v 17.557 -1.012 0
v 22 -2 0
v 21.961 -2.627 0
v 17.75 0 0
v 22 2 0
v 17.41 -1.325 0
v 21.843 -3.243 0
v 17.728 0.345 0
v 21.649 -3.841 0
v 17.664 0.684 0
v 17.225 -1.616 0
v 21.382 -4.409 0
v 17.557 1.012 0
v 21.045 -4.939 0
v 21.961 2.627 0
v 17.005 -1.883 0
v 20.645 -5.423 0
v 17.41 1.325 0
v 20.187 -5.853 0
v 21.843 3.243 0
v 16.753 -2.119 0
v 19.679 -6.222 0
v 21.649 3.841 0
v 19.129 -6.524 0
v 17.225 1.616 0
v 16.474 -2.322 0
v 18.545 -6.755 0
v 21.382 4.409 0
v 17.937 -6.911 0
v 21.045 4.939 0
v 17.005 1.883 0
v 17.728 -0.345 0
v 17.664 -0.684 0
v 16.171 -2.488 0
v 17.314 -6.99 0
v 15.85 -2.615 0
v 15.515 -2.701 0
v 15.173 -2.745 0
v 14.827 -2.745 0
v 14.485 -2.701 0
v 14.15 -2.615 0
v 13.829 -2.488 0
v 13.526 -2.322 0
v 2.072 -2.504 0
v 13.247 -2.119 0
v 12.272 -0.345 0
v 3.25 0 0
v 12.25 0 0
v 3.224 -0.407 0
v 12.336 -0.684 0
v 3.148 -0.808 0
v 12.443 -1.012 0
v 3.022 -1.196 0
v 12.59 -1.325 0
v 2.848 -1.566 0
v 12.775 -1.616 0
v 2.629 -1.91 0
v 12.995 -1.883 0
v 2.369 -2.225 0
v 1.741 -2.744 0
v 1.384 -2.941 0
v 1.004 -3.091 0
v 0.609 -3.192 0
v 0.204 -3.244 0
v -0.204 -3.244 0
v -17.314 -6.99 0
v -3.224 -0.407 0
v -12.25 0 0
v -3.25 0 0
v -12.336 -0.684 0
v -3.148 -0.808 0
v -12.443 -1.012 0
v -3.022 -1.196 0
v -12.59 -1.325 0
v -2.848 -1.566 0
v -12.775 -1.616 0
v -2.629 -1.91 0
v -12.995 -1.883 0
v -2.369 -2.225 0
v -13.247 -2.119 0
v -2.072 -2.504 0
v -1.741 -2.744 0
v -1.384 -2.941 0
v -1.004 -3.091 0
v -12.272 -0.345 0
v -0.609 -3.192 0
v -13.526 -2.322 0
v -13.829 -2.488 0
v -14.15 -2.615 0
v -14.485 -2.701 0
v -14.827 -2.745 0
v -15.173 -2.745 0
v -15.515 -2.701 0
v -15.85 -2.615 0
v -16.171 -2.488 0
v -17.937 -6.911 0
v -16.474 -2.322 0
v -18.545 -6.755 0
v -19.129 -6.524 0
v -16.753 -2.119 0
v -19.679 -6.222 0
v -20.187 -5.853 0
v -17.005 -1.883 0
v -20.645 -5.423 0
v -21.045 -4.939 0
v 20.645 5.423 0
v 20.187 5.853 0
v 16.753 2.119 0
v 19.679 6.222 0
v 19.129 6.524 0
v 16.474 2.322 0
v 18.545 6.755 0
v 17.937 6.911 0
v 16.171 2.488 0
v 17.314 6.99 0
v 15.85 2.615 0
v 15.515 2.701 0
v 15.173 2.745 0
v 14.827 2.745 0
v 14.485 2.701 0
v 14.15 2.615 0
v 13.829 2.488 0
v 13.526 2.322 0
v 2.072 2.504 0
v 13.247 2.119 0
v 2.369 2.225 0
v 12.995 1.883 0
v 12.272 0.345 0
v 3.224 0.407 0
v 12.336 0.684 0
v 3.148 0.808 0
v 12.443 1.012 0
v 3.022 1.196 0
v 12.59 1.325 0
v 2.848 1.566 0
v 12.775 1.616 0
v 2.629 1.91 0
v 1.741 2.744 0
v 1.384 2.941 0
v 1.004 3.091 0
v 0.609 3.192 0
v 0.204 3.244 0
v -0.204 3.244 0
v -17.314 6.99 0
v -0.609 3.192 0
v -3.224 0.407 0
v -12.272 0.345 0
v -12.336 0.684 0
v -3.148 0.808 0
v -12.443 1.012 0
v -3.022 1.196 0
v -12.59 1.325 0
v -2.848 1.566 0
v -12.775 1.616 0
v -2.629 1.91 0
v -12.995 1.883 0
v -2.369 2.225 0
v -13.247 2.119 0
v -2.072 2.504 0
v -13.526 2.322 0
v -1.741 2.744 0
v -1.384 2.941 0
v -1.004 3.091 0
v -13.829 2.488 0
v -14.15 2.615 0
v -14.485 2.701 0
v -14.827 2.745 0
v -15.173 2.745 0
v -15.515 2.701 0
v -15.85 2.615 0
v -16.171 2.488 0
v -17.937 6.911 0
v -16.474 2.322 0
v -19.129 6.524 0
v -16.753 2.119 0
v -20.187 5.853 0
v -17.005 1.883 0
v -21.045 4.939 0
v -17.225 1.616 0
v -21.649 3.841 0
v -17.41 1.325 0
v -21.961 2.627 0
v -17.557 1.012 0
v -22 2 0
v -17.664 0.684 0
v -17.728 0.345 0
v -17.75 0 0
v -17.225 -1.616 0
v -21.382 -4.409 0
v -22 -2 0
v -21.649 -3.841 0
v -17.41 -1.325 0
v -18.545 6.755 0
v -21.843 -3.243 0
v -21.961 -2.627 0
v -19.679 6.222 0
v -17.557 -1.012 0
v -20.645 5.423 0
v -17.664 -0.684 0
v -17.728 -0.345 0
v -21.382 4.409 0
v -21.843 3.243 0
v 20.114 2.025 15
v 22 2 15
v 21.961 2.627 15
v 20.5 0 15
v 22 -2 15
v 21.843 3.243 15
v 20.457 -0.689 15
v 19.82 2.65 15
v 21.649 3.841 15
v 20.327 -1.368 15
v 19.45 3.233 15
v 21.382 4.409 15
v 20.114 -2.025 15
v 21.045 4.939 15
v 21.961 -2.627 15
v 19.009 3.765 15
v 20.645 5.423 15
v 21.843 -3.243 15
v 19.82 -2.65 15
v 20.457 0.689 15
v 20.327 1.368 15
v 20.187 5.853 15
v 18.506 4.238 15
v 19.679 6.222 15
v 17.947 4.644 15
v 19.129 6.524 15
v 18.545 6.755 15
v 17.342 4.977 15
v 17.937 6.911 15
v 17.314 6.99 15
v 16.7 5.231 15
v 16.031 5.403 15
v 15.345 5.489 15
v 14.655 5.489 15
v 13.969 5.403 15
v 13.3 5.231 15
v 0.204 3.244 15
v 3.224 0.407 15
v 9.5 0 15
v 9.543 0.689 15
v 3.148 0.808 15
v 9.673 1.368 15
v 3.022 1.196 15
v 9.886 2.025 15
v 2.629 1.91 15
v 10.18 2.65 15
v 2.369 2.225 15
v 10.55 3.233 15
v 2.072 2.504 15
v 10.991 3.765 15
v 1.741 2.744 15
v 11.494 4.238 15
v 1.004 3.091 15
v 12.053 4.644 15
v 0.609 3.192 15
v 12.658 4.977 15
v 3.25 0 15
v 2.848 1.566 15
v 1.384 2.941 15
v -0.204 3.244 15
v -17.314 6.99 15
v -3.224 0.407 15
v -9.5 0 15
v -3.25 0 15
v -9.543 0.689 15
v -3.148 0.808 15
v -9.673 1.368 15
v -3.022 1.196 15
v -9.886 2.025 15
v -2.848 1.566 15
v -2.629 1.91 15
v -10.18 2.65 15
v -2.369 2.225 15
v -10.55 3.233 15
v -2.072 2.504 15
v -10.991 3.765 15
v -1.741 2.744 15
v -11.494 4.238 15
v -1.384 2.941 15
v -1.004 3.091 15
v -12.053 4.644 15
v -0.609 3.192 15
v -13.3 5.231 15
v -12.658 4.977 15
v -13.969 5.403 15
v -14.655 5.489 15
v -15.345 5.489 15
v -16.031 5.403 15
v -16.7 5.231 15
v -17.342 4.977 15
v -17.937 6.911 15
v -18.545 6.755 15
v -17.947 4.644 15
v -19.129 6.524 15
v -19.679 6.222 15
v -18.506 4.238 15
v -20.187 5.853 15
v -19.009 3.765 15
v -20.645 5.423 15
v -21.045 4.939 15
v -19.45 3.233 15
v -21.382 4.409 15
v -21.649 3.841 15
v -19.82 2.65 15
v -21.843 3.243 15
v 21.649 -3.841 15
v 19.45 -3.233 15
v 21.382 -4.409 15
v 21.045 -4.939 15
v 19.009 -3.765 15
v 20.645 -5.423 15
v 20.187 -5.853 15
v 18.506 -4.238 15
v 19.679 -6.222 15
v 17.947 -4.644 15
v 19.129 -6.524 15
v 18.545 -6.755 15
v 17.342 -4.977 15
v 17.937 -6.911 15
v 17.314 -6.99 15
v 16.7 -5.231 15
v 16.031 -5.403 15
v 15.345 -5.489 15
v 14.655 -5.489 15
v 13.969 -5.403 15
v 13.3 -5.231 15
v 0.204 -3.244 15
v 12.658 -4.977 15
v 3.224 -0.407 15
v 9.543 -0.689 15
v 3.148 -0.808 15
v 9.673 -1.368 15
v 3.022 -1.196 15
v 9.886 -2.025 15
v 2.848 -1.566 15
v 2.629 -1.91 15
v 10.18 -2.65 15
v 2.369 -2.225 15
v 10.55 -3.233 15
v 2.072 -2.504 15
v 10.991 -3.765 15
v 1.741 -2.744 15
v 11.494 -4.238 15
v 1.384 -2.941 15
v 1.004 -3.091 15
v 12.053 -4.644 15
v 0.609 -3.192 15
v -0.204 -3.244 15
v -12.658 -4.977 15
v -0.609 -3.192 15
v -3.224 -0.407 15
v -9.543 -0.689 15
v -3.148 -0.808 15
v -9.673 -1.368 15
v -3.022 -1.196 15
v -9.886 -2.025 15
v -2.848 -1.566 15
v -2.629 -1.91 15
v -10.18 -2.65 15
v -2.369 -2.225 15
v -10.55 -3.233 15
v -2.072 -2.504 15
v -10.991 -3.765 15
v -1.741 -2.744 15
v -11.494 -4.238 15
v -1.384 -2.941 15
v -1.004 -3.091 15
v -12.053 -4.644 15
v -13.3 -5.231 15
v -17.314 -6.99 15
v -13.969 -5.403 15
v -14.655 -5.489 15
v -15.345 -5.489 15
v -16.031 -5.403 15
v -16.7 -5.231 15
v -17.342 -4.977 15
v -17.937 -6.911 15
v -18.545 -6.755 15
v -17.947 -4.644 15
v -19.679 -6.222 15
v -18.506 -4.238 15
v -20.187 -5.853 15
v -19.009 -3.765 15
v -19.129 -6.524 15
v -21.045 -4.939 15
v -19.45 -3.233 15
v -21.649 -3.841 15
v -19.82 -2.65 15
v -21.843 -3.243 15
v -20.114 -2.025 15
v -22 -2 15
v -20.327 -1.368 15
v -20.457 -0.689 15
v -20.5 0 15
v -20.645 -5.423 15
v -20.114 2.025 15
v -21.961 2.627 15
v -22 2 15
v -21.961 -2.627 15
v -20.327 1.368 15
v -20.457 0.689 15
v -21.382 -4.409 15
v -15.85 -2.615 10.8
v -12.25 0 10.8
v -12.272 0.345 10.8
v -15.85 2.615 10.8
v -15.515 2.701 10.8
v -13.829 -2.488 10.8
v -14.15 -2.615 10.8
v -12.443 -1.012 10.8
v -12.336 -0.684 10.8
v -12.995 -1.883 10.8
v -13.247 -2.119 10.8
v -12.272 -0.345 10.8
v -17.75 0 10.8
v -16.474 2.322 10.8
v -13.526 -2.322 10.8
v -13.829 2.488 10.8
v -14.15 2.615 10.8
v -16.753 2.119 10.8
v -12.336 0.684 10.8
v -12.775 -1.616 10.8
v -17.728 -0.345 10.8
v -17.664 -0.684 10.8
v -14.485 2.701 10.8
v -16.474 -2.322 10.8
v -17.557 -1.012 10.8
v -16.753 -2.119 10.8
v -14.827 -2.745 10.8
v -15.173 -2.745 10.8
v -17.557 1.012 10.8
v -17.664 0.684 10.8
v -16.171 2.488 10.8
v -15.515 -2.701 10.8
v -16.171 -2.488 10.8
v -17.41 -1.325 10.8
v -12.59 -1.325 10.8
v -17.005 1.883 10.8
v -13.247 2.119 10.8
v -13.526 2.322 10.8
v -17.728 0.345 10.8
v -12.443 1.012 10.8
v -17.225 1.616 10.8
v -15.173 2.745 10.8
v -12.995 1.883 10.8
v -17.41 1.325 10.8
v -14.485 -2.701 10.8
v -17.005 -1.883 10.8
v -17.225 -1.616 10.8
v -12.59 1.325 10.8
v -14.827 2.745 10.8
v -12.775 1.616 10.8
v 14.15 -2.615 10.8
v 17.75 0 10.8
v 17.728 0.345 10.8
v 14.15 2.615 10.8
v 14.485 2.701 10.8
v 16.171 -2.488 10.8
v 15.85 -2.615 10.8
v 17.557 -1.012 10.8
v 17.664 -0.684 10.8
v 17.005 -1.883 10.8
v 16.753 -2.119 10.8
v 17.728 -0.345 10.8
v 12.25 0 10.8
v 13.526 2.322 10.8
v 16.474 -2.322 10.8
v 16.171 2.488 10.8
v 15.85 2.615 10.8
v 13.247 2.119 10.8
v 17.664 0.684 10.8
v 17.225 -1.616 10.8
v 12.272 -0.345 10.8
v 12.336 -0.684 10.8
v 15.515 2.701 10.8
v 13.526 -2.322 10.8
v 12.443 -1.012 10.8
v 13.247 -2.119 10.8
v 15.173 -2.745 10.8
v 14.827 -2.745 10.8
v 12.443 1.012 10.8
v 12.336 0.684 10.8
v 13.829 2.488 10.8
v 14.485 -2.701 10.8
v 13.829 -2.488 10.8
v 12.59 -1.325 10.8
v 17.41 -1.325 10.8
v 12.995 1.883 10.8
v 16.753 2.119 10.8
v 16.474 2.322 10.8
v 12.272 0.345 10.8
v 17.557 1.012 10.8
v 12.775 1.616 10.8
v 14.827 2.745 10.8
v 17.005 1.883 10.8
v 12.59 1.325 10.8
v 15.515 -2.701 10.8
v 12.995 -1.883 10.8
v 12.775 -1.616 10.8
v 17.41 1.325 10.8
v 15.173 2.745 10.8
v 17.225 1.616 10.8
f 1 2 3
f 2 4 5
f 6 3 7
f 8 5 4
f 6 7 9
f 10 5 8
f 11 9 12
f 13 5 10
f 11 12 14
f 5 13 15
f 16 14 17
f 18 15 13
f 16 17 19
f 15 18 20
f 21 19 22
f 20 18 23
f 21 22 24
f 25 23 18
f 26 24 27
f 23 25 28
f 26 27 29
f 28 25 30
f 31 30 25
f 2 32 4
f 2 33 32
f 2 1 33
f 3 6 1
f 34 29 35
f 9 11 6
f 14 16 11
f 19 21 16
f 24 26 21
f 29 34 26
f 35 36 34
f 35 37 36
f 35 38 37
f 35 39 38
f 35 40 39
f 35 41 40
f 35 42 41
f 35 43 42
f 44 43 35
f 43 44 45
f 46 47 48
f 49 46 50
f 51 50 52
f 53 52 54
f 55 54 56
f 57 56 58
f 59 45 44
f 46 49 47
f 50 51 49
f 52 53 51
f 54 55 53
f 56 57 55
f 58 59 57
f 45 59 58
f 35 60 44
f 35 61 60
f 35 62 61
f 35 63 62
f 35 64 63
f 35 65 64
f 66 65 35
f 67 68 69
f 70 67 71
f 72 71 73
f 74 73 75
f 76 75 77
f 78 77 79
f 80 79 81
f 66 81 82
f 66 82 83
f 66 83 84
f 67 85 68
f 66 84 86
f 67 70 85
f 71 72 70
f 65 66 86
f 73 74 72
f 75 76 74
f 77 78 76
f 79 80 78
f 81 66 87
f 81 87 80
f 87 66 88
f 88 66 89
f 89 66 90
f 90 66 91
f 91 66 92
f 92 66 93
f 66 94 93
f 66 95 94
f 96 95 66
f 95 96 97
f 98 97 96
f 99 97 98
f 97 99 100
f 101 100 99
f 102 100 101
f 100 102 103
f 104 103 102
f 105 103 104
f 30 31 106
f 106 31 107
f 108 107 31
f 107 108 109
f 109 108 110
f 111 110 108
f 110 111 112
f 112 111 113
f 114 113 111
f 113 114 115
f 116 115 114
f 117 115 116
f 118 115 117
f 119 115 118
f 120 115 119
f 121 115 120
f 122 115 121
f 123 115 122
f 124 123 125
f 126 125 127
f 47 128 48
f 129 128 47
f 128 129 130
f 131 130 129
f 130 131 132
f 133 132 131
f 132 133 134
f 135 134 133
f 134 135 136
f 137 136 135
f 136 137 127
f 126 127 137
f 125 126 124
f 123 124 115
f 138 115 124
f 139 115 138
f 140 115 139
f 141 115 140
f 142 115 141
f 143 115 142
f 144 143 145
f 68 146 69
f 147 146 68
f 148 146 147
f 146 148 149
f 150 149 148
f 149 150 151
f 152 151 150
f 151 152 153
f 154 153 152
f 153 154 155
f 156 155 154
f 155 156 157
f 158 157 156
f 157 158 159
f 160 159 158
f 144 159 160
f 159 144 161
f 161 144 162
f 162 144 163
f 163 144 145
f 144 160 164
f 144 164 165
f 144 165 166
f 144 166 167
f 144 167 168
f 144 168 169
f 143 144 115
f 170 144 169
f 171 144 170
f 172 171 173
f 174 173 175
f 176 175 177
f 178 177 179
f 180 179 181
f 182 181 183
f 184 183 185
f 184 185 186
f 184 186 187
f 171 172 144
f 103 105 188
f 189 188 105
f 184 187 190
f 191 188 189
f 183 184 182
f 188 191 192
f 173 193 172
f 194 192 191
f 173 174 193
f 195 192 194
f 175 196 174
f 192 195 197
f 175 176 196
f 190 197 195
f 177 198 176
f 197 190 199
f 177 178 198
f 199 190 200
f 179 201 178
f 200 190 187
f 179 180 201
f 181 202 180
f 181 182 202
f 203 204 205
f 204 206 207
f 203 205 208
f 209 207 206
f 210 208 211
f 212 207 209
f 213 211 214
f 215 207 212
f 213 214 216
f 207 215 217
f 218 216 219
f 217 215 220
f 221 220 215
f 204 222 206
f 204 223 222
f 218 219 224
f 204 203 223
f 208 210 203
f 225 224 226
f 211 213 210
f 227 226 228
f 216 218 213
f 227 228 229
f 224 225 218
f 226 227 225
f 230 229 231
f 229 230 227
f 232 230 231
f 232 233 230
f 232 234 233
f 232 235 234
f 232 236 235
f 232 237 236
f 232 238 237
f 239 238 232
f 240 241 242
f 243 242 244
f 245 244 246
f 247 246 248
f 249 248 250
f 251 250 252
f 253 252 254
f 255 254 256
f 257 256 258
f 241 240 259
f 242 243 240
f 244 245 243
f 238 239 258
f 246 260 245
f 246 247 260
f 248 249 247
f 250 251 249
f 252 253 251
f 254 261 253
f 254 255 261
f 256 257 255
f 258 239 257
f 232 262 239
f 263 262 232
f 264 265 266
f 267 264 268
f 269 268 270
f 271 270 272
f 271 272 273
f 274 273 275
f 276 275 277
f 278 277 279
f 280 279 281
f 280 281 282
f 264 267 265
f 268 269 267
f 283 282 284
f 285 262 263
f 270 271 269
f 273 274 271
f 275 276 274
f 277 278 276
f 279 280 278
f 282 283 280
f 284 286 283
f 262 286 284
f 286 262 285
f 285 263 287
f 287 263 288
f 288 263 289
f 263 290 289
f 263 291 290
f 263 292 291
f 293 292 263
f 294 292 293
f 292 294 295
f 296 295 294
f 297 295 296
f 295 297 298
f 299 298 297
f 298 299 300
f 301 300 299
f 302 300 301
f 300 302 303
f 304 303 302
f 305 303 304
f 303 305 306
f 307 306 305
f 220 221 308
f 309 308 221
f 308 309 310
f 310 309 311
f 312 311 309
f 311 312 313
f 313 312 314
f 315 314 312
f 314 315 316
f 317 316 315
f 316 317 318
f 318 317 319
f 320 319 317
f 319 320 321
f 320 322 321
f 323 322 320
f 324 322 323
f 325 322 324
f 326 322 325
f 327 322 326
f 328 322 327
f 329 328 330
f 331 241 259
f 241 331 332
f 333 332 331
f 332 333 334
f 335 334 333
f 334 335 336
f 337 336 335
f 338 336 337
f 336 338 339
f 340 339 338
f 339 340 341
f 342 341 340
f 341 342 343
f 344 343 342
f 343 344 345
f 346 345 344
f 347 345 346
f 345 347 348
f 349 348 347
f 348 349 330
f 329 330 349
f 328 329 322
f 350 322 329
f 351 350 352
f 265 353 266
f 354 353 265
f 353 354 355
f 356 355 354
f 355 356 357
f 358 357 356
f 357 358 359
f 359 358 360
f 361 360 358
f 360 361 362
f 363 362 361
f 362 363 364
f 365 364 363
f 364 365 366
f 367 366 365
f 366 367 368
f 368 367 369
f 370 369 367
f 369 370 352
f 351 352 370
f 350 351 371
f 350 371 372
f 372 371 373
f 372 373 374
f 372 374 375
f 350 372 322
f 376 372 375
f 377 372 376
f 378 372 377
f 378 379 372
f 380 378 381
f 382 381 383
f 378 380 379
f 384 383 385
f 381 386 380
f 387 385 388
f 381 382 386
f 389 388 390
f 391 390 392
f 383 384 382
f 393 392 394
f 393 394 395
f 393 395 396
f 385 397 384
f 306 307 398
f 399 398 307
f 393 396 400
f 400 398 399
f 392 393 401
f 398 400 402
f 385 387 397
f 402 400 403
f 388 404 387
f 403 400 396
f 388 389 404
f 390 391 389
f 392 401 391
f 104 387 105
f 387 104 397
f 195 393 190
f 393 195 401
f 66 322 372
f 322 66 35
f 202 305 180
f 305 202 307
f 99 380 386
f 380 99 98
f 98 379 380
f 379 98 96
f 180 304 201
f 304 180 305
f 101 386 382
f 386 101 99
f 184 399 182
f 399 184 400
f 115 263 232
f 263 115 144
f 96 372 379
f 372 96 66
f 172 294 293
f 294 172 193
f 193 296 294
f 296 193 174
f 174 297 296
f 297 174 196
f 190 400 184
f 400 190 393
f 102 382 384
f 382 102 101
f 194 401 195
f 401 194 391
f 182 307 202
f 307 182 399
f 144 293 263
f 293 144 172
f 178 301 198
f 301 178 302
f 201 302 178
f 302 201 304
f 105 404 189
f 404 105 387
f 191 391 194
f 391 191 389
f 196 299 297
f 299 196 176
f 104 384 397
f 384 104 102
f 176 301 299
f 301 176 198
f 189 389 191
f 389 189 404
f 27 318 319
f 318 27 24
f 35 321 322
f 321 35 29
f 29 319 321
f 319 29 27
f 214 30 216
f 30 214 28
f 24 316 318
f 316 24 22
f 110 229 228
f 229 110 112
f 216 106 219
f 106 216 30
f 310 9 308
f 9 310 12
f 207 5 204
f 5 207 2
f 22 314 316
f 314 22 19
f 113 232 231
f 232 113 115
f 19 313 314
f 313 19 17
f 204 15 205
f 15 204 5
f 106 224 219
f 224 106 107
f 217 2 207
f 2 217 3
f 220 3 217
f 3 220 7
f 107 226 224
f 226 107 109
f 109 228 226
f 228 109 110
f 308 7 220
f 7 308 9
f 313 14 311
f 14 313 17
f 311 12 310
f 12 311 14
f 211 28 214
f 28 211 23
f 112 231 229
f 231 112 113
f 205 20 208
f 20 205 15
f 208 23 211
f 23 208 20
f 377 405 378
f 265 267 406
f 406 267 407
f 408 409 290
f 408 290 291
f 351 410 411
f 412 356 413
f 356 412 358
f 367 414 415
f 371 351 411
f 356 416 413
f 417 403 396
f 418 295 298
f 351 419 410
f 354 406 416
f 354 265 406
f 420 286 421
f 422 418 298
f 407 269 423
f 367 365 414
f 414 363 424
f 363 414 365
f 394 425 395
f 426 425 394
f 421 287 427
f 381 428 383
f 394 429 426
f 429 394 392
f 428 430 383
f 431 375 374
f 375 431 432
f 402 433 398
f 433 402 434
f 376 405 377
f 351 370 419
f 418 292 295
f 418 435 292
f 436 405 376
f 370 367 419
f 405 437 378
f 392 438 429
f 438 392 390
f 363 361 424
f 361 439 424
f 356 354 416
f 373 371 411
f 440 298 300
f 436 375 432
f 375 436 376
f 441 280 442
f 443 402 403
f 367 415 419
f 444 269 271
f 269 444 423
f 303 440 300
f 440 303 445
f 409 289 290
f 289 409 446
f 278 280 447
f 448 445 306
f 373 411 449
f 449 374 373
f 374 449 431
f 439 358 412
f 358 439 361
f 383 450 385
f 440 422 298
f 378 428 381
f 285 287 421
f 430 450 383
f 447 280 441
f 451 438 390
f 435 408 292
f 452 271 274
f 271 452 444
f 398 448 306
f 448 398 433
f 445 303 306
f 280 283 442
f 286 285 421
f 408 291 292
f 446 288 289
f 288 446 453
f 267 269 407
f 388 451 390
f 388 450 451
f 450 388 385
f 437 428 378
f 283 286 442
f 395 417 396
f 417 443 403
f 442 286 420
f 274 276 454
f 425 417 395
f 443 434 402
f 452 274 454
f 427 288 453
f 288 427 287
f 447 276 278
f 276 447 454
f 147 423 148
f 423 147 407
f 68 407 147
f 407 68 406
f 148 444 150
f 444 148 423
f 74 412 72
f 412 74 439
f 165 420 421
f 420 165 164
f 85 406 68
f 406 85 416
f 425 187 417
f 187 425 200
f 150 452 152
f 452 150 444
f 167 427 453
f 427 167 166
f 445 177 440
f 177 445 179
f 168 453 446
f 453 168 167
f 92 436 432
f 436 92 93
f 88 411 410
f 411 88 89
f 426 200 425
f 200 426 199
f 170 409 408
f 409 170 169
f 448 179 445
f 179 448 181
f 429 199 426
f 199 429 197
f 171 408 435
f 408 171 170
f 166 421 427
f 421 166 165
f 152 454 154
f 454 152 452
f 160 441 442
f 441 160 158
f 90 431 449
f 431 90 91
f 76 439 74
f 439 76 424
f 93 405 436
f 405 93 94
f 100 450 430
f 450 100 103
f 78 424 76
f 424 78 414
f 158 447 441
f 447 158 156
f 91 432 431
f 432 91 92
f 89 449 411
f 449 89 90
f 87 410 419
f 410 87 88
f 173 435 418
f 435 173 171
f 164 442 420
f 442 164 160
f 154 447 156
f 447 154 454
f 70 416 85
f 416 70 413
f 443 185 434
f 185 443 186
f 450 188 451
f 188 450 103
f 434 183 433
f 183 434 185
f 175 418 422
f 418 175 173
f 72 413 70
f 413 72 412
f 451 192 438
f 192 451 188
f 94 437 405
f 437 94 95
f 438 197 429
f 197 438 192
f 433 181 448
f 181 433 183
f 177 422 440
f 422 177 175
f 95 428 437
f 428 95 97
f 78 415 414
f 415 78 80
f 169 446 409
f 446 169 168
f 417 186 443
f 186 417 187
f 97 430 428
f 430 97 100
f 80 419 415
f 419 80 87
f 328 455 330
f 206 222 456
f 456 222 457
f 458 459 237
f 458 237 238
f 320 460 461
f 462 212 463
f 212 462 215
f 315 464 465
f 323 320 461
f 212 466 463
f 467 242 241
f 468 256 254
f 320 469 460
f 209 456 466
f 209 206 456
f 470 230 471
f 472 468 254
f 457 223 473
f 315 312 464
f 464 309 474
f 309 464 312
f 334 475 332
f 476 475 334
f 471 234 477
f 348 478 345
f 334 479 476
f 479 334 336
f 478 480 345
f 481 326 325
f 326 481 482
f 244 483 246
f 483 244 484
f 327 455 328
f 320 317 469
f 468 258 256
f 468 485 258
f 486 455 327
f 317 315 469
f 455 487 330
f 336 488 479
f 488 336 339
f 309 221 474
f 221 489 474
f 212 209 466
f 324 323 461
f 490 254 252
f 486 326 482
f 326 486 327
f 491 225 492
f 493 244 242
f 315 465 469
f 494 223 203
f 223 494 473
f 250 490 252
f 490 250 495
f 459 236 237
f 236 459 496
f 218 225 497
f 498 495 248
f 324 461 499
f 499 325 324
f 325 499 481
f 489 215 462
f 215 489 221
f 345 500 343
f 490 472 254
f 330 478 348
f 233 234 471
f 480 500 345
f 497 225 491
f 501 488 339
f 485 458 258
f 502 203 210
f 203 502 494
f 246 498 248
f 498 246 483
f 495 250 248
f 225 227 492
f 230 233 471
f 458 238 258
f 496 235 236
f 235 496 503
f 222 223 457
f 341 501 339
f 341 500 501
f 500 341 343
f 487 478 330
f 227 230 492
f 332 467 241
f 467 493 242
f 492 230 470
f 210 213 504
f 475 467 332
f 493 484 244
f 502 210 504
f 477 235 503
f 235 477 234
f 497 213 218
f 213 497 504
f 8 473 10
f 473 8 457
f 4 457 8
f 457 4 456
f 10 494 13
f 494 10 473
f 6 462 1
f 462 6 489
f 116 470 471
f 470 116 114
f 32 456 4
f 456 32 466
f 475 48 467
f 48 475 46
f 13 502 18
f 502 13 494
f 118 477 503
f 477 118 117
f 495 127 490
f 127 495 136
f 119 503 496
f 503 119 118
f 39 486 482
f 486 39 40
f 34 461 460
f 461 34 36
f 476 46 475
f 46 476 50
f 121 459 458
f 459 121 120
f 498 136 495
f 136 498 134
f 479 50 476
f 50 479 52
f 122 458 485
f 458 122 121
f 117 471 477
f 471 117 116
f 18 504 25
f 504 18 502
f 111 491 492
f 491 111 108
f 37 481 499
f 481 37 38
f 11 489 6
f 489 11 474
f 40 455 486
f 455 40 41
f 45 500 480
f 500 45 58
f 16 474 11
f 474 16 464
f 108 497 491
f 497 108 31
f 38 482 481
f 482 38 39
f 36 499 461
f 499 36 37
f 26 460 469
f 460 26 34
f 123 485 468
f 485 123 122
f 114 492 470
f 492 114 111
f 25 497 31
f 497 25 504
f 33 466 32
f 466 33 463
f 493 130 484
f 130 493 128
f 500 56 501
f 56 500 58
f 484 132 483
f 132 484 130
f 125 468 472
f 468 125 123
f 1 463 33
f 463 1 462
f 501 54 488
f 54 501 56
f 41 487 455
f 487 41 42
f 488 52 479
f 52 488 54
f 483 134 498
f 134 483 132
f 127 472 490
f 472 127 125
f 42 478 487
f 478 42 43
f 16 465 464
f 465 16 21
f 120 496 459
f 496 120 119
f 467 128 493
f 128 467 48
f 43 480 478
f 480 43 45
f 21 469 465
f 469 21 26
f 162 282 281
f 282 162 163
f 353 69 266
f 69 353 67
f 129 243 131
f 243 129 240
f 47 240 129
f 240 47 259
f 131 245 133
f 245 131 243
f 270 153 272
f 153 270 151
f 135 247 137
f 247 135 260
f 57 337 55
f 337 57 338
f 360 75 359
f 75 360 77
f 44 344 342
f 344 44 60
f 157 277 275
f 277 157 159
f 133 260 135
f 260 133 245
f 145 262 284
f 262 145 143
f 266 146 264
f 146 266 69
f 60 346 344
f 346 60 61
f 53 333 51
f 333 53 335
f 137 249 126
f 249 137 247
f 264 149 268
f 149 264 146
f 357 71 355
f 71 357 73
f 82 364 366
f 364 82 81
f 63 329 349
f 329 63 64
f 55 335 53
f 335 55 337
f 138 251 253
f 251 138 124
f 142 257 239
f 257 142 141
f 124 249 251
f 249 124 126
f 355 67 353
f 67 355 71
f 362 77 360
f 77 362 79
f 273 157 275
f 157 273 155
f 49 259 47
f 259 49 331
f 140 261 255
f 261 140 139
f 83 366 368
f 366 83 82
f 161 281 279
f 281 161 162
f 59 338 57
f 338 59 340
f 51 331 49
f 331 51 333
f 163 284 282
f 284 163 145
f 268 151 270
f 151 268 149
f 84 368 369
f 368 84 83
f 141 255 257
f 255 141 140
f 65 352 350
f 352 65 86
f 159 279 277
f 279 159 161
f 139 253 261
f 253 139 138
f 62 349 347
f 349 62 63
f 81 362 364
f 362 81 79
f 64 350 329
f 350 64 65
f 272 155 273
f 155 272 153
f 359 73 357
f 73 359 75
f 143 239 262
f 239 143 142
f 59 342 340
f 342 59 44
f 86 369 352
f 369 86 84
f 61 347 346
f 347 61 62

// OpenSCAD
$fn = 50;


difference() {
	union() {
		cylinder(h = 15, r = 7.0000000000);
		translate(v = [-7.5000000000, 0.0000000000, 0]) {
			hull() {
				translate(v = [-9.5000000000, 2.0000000000, 0]) {
					cylinder(h = 15, r = 5);
				}
				translate(v = [9.5000000000, 2.0000000000, 0]) {
					cylinder(h = 15, r = 5);
				}
				translate(v = [-9.5000000000, -2.0000000000, 0]) {
					cylinder(h = 15, r = 5);
				}
				translate(v = [9.5000000000, -2.0000000000, 0]) {
					cylinder(h = 15, r = 5);
				}
			}
		}
		translate(v = [-7.5000000000, 0.0000000000, 0]) {
			hull() {
				translate(v = [-9.5000000000, 2.0000000000, 0]) {
					cylinder(h = 15, r = 5);
				}
				translate(v = [9.5000000000, 2.0000000000, 0]) {
					cylinder(h = 15, r = 5);
				}
				translate(v = [-9.5000000000, -2.0000000000, 0]) {
					cylinder(h = 15, r = 5);
				}
				translate(v = [9.5000000000, -2.0000000000, 0]) {
					cylinder(h = 15, r = 5);
				}
			}
		}
		translate(v = [7.5000000000, 0.0000000000, 0]) {
			hull() {
				translate(v = [-9.5000000000, 2.0000000000, 0]) {
					cylinder(h = 15, r = 5);
				}
				translate(v = [9.5000000000, 2.0000000000, 0]) {
					cylinder(h = 15, r = 5);
				}
				translate(v = [-9.5000000000, -2.0000000000, 0]) {
					cylinder(h = 15, r = 5);
				}
				translate(v = [9.5000000000, -2.0000000000, 0]) {
					cylinder(h = 15, r = 5);
				}
			}
		}
		translate(v = [7.5000000000, 0.0000000000, 0]) {
			hull() {
				translate(v = [-9.5000000000, 2.0000000000, 0]) {
					cylinder(h = 15, r = 5);
				}
				translate(v = [9.5000000000, 2.0000000000, 0]) {
					cylinder(h = 15, r = 5);
				}
				translate(v = [-9.5000000000, -2.0000000000, 0]) {
					cylinder(h = 15, r = 5);
				}
				translate(v = [9.5000000000, -2.0000000000, 0]) {
					cylinder(h = 15, r = 5);
				}
			}
		}
	}
	union() {
		translate(v = [-15.0000000000, 0.0000000000, 15]) {
			rotate(a = [0, 0, 0]) {
				difference() {
					union() {
						#translate(v = [0, 0, -15.0000000000]) {
							cylinder(h = 15, r = 2.2500000000);
						}
						#translate(v = [0, 0, -4.2000000000]) {
							cylinder(h = 4.2000000000, r1 = 2.7500000000, r2 = 5.5000000000);
						}
						#translate(v = [0, 0, -15.0000000000]) {
							cylinder(h = 15, r = 2.7500000000);
						}
						#translate(v = [0, 0, -15.0000000000]) {
							cylinder(h = 15, r = 2.2500000000);
						}
					}
					union();
				}
			}
		}
		translate(v = [-15.0000000000, 0.0000000000, 15]) {
			rotate(a = [0, 0, 0]) {
				difference() {
					union() {
						#translate(v = [0, 0, -15.0000000000]) {
							cylinder(h = 15, r = 2.2500000000);
						}
						#translate(v = [0, 0, -4.2000000000]) {
							cylinder(h = 4.2000000000, r1 = 2.7500000000, r2 = 5.5000000000);
						}
						#translate(v = [0, 0, -15.0000000000]) {
							cylinder(h = 15, r = 2.7500000000);
						}
						#translate(v = [0, 0, -15.0000000000]) {
							cylinder(h = 15, r = 2.2500000000);
						}
					}
					union();
				}
			}
		}
		translate(v = [15.0000000000, 0.0000000000, 15]) {
			rotate(a = [0, 0, 0]) {
				difference() {
					union() {
						#translate(v = [0, 0, -15.0000000000]) {
							cylinder(h = 15, r = 2.2500000000);
						}
						#translate(v = [0, 0, -4.2000000000]) {
							cylinder(h = 4.2000000000, r1 = 2.7500000000, r2 = 5.5000000000);
						}
						#translate(v = [0, 0, -15.0000000000]) {
							cylinder(h = 15, r = 2.7500000000);
						}
						#translate(v = [0, 0, -15.0000000000]) {
							cylinder(h = 15, r = 2.2500000000);
						}
					}
					union();
				}
			}
		}
		translate(v = [15.0000000000, 0.0000000000, 15]) {
			rotate(a = [0, 0, 0]) {
				difference() {
					union() {
						#translate(v = [0, 0, -15.0000000000]) {
							cylinder(h = 15, r = 2.2500000000);
						}
						#translate(v = [0, 0, -4.2000000000]) {
							cylinder(h = 4.2000000000, r1 = 2.7500000000, r2 = 5.5000000000);
						}
						#translate(v = [0, 0, -15.0000000000]) {
							cylinder(h = 15, r = 2.7500000000);
						}
						#translate(v = [0, 0, -15.0000000000]) {
							cylinder(h = 15, r = 2.2500000000);
						}
					}
					union();
				}
			}
		}
		translate(v = [0, 0, -100]) {
			cylinder(h = 200, r = 3.2500000000);
		}
		translate(v = [0, 0, -100]) {
			cylinder(h = 200, r = 1.8000000000);
		}
	}
}
